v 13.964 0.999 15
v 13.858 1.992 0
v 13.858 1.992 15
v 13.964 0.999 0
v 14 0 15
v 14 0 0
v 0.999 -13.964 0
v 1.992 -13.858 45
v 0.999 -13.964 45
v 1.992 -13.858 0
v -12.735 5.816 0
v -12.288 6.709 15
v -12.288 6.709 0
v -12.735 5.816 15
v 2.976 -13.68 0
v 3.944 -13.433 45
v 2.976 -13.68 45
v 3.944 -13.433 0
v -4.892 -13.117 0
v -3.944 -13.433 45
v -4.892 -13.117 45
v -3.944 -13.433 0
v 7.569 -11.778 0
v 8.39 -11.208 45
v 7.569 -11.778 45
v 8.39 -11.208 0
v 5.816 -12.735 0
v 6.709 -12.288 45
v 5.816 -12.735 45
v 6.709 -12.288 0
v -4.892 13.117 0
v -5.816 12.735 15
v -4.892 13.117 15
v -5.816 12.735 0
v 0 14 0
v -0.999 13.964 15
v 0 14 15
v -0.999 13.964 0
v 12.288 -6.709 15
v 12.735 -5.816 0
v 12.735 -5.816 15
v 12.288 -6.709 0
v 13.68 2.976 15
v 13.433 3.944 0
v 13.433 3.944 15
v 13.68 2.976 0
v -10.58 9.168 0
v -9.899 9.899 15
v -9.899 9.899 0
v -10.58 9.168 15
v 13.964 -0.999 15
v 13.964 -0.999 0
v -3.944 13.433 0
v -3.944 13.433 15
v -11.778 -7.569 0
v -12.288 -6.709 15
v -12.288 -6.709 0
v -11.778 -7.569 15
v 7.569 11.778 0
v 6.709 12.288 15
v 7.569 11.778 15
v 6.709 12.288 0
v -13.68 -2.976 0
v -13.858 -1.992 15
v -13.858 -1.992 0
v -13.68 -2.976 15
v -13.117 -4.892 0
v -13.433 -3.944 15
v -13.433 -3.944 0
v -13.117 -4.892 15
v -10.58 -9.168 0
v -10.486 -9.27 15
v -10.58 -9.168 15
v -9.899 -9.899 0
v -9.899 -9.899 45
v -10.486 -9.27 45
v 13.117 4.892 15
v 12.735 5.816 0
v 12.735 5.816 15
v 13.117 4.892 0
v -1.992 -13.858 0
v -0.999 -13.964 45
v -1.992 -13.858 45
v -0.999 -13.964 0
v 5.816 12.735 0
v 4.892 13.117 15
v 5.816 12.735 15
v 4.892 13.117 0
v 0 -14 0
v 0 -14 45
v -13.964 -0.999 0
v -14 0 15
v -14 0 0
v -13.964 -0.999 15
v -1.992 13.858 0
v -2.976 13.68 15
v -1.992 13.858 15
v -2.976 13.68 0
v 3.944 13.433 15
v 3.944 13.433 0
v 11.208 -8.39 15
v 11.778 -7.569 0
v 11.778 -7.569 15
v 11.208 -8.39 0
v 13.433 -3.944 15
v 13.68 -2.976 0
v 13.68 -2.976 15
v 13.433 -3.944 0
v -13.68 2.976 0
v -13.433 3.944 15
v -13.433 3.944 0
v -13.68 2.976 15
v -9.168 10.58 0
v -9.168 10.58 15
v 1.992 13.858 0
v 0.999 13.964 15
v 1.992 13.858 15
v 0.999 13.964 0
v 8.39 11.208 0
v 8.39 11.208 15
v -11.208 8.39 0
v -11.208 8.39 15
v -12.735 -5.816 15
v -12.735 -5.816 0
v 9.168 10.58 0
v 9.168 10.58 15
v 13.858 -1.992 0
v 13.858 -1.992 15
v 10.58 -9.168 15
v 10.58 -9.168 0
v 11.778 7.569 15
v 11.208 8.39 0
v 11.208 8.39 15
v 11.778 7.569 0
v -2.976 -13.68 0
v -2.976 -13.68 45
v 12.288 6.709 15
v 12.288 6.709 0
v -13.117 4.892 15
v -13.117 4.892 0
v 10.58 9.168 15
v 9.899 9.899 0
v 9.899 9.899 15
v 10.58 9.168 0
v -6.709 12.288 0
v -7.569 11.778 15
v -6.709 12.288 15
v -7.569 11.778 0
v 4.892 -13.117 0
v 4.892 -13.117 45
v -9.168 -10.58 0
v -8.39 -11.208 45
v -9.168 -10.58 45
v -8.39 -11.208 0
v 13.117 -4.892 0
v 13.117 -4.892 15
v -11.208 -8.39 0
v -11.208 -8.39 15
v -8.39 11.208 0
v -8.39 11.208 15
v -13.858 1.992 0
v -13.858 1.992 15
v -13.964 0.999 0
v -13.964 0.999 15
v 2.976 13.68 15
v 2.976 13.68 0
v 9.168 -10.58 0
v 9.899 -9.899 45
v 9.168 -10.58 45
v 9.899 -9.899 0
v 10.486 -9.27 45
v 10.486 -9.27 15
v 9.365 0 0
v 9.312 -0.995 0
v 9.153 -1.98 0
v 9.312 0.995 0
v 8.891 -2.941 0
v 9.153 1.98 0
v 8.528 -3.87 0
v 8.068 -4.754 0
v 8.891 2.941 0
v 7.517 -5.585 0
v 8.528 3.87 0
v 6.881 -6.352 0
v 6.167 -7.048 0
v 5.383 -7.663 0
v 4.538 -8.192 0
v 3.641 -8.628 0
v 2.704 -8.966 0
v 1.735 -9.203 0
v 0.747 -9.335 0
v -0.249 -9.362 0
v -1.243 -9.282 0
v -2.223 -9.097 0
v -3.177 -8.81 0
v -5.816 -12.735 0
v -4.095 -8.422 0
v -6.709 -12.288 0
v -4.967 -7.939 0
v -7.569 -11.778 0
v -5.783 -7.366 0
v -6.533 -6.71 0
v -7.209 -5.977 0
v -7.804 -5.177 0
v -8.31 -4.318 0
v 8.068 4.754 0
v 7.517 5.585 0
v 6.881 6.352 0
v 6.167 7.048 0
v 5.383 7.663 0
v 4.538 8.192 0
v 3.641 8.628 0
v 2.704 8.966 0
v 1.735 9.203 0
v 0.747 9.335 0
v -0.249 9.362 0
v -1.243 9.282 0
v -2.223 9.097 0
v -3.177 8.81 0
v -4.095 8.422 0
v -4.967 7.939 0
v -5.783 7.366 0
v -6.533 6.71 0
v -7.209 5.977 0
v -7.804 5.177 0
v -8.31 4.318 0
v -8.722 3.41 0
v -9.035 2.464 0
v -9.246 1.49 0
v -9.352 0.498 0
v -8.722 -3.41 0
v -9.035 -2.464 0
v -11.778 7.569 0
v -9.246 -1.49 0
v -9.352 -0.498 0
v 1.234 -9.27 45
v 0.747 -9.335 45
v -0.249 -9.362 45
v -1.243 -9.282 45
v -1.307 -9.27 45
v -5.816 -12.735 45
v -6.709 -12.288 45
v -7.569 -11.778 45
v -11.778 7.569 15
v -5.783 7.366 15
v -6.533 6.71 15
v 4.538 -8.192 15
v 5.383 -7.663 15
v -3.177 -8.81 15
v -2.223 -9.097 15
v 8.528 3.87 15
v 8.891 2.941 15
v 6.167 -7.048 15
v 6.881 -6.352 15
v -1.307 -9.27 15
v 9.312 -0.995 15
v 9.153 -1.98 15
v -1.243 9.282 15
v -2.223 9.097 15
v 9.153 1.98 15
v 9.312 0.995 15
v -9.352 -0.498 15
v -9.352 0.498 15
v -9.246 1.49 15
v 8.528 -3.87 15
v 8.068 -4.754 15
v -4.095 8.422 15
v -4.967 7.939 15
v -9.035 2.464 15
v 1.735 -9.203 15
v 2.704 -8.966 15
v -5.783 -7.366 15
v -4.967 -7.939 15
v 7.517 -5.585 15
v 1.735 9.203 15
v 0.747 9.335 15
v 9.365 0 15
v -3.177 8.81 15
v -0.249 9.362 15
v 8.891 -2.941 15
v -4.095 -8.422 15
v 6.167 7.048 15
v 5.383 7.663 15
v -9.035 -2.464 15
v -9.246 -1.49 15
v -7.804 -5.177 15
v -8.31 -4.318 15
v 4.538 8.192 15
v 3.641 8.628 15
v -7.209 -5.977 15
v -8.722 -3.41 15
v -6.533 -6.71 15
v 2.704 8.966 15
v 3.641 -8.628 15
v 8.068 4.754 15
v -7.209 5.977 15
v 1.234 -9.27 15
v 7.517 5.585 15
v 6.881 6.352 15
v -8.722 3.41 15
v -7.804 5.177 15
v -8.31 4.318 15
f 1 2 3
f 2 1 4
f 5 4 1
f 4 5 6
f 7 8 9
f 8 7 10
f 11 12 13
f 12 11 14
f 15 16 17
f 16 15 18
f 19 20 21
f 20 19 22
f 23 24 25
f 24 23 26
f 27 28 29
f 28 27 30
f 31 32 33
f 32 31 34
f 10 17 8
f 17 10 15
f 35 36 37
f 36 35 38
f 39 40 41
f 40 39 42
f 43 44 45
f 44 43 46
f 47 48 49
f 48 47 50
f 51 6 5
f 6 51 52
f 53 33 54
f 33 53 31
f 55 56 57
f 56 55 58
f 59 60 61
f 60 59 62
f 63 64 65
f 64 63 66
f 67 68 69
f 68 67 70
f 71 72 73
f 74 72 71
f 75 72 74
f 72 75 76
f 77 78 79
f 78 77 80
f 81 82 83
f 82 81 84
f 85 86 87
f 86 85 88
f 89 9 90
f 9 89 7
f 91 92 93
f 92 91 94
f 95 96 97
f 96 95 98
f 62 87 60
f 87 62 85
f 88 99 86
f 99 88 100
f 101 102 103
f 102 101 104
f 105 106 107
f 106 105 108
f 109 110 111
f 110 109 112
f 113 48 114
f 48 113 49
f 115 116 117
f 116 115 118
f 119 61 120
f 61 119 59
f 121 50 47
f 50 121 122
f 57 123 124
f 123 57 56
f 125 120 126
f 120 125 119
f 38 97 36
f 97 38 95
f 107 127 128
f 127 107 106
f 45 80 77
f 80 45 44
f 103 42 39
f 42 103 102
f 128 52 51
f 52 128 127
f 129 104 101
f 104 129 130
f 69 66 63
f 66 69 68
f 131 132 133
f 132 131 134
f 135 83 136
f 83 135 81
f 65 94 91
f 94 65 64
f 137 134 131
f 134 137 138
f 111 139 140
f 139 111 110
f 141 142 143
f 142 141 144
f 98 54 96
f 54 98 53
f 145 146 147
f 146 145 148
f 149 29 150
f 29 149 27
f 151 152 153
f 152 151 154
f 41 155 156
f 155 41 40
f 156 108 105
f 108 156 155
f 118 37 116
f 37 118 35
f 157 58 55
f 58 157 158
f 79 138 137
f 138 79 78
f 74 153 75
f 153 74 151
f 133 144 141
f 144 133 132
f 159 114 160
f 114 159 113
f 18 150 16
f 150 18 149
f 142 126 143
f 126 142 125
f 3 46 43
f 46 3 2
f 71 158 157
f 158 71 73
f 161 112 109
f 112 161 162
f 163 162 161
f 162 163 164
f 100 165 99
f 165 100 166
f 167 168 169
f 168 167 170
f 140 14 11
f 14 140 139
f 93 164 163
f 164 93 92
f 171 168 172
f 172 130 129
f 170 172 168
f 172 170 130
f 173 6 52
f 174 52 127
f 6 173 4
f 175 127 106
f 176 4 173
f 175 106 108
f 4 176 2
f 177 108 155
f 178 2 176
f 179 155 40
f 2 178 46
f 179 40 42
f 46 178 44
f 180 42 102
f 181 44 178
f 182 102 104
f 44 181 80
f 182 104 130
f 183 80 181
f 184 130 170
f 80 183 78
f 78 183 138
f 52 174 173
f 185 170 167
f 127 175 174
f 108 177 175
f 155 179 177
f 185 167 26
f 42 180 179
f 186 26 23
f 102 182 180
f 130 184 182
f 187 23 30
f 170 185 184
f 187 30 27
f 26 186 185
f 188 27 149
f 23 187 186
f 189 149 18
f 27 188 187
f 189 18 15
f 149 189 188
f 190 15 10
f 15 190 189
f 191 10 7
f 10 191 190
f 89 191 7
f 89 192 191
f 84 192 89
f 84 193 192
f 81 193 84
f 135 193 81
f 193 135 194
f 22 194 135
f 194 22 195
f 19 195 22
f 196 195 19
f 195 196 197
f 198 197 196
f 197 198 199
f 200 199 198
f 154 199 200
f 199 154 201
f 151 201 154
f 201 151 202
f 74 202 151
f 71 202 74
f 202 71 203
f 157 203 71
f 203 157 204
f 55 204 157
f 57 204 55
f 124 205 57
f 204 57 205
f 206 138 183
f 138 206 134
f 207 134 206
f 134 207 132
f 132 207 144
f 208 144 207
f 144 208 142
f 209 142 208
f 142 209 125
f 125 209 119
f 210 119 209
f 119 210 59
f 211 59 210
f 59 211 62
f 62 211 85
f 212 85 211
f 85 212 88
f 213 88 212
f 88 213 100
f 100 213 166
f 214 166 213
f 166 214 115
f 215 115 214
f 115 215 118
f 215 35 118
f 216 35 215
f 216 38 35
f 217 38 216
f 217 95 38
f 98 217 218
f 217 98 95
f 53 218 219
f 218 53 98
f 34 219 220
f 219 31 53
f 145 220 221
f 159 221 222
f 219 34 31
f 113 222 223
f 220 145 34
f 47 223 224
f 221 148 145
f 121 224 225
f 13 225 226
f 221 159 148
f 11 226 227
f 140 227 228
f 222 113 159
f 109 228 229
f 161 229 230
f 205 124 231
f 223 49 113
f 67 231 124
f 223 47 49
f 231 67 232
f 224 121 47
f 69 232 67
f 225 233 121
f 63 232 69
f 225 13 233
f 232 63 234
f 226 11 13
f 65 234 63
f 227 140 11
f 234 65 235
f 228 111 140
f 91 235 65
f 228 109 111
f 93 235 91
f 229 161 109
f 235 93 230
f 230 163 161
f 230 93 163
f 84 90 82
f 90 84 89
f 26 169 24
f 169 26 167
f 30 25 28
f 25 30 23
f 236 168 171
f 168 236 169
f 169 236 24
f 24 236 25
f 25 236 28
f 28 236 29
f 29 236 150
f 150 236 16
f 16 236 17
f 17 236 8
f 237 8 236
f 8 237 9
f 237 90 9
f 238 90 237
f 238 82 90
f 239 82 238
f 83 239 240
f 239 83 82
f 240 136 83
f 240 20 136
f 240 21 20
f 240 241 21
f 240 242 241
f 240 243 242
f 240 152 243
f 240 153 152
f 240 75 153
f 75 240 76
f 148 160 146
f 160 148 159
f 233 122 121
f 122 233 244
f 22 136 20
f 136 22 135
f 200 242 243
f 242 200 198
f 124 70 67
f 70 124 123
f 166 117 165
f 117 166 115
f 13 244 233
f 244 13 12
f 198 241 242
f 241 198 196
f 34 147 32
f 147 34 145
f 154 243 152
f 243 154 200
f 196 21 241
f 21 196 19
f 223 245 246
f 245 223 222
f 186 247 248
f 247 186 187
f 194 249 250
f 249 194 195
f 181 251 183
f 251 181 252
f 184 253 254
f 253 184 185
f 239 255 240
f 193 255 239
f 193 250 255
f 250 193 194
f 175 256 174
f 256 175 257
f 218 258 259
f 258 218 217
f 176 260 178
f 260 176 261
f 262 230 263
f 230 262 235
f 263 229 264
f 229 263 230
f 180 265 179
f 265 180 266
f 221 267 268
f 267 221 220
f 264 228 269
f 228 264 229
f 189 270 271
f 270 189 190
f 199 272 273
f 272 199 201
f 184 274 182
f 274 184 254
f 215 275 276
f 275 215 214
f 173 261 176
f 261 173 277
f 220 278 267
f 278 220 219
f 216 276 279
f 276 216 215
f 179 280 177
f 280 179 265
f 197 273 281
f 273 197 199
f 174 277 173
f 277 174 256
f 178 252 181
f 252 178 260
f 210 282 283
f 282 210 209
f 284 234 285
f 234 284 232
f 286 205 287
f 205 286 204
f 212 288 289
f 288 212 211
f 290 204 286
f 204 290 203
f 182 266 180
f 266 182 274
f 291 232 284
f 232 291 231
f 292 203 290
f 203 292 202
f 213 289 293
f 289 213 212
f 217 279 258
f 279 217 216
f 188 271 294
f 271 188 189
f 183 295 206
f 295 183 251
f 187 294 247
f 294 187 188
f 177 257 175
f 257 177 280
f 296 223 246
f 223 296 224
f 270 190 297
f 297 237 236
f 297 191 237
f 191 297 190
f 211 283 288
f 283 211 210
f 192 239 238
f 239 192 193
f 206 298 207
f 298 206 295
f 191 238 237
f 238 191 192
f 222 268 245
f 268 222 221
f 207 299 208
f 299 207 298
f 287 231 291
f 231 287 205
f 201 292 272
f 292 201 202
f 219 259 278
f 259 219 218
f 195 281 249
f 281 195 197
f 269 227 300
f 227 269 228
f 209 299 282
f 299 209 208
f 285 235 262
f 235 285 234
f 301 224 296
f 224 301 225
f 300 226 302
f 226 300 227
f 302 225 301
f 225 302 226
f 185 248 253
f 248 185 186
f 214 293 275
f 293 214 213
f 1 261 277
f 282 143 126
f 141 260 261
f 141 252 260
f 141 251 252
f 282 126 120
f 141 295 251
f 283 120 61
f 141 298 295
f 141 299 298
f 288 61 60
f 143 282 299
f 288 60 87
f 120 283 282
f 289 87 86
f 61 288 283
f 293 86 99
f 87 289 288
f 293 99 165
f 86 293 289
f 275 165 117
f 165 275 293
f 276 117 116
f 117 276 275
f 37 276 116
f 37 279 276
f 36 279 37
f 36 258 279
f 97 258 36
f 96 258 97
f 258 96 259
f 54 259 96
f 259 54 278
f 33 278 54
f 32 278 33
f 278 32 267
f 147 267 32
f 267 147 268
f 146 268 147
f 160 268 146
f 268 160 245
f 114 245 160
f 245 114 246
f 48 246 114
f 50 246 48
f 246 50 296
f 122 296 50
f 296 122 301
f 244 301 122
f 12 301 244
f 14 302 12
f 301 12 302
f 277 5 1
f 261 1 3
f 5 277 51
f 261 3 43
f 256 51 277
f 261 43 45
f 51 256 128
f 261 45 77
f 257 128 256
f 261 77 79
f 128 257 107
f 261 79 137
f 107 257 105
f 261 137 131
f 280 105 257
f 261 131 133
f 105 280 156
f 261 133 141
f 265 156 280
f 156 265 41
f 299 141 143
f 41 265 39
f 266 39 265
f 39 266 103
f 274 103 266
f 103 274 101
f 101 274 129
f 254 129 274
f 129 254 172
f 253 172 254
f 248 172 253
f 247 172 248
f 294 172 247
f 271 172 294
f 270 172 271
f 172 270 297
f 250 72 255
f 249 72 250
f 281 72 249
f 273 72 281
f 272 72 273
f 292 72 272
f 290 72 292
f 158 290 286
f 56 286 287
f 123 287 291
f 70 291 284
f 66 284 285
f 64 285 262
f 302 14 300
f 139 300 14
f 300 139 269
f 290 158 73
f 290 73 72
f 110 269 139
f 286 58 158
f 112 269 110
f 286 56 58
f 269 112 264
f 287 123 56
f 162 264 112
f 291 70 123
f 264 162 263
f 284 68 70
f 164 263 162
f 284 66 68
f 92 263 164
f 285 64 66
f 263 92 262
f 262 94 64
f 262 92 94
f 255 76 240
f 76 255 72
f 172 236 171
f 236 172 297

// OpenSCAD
// all measurements are in millimeters
// this is the 3D print design of the MRI-EPR adaptor ring. It will be precisely the resonator size.
//I have not accounted for shrinking, these are the specified dimentions.

Resonator_diameter = 18.73;
Resonator_height = 15.0;
Adaptor_diameter = 28;
Total_height = Resonator_height +30;
Cutout_dim = 30;


    difference()
    {    
    cylinder(d = Adaptor_diameter, h = Total_height, $fs = 1,$fa  = 1);       
    cylinder(d = Resonator_diameter, h = Total_height, $fs = 1,$fa  = 1);  
    translate([0,(Cutout_dim/2)-(Adaptor_diameter-Resonator_diameter),(Cutout_dim/2)+Resonator_height])
    cube([Cutout_dim,Cutout_dim,Cutout_dim ],true);
    }
